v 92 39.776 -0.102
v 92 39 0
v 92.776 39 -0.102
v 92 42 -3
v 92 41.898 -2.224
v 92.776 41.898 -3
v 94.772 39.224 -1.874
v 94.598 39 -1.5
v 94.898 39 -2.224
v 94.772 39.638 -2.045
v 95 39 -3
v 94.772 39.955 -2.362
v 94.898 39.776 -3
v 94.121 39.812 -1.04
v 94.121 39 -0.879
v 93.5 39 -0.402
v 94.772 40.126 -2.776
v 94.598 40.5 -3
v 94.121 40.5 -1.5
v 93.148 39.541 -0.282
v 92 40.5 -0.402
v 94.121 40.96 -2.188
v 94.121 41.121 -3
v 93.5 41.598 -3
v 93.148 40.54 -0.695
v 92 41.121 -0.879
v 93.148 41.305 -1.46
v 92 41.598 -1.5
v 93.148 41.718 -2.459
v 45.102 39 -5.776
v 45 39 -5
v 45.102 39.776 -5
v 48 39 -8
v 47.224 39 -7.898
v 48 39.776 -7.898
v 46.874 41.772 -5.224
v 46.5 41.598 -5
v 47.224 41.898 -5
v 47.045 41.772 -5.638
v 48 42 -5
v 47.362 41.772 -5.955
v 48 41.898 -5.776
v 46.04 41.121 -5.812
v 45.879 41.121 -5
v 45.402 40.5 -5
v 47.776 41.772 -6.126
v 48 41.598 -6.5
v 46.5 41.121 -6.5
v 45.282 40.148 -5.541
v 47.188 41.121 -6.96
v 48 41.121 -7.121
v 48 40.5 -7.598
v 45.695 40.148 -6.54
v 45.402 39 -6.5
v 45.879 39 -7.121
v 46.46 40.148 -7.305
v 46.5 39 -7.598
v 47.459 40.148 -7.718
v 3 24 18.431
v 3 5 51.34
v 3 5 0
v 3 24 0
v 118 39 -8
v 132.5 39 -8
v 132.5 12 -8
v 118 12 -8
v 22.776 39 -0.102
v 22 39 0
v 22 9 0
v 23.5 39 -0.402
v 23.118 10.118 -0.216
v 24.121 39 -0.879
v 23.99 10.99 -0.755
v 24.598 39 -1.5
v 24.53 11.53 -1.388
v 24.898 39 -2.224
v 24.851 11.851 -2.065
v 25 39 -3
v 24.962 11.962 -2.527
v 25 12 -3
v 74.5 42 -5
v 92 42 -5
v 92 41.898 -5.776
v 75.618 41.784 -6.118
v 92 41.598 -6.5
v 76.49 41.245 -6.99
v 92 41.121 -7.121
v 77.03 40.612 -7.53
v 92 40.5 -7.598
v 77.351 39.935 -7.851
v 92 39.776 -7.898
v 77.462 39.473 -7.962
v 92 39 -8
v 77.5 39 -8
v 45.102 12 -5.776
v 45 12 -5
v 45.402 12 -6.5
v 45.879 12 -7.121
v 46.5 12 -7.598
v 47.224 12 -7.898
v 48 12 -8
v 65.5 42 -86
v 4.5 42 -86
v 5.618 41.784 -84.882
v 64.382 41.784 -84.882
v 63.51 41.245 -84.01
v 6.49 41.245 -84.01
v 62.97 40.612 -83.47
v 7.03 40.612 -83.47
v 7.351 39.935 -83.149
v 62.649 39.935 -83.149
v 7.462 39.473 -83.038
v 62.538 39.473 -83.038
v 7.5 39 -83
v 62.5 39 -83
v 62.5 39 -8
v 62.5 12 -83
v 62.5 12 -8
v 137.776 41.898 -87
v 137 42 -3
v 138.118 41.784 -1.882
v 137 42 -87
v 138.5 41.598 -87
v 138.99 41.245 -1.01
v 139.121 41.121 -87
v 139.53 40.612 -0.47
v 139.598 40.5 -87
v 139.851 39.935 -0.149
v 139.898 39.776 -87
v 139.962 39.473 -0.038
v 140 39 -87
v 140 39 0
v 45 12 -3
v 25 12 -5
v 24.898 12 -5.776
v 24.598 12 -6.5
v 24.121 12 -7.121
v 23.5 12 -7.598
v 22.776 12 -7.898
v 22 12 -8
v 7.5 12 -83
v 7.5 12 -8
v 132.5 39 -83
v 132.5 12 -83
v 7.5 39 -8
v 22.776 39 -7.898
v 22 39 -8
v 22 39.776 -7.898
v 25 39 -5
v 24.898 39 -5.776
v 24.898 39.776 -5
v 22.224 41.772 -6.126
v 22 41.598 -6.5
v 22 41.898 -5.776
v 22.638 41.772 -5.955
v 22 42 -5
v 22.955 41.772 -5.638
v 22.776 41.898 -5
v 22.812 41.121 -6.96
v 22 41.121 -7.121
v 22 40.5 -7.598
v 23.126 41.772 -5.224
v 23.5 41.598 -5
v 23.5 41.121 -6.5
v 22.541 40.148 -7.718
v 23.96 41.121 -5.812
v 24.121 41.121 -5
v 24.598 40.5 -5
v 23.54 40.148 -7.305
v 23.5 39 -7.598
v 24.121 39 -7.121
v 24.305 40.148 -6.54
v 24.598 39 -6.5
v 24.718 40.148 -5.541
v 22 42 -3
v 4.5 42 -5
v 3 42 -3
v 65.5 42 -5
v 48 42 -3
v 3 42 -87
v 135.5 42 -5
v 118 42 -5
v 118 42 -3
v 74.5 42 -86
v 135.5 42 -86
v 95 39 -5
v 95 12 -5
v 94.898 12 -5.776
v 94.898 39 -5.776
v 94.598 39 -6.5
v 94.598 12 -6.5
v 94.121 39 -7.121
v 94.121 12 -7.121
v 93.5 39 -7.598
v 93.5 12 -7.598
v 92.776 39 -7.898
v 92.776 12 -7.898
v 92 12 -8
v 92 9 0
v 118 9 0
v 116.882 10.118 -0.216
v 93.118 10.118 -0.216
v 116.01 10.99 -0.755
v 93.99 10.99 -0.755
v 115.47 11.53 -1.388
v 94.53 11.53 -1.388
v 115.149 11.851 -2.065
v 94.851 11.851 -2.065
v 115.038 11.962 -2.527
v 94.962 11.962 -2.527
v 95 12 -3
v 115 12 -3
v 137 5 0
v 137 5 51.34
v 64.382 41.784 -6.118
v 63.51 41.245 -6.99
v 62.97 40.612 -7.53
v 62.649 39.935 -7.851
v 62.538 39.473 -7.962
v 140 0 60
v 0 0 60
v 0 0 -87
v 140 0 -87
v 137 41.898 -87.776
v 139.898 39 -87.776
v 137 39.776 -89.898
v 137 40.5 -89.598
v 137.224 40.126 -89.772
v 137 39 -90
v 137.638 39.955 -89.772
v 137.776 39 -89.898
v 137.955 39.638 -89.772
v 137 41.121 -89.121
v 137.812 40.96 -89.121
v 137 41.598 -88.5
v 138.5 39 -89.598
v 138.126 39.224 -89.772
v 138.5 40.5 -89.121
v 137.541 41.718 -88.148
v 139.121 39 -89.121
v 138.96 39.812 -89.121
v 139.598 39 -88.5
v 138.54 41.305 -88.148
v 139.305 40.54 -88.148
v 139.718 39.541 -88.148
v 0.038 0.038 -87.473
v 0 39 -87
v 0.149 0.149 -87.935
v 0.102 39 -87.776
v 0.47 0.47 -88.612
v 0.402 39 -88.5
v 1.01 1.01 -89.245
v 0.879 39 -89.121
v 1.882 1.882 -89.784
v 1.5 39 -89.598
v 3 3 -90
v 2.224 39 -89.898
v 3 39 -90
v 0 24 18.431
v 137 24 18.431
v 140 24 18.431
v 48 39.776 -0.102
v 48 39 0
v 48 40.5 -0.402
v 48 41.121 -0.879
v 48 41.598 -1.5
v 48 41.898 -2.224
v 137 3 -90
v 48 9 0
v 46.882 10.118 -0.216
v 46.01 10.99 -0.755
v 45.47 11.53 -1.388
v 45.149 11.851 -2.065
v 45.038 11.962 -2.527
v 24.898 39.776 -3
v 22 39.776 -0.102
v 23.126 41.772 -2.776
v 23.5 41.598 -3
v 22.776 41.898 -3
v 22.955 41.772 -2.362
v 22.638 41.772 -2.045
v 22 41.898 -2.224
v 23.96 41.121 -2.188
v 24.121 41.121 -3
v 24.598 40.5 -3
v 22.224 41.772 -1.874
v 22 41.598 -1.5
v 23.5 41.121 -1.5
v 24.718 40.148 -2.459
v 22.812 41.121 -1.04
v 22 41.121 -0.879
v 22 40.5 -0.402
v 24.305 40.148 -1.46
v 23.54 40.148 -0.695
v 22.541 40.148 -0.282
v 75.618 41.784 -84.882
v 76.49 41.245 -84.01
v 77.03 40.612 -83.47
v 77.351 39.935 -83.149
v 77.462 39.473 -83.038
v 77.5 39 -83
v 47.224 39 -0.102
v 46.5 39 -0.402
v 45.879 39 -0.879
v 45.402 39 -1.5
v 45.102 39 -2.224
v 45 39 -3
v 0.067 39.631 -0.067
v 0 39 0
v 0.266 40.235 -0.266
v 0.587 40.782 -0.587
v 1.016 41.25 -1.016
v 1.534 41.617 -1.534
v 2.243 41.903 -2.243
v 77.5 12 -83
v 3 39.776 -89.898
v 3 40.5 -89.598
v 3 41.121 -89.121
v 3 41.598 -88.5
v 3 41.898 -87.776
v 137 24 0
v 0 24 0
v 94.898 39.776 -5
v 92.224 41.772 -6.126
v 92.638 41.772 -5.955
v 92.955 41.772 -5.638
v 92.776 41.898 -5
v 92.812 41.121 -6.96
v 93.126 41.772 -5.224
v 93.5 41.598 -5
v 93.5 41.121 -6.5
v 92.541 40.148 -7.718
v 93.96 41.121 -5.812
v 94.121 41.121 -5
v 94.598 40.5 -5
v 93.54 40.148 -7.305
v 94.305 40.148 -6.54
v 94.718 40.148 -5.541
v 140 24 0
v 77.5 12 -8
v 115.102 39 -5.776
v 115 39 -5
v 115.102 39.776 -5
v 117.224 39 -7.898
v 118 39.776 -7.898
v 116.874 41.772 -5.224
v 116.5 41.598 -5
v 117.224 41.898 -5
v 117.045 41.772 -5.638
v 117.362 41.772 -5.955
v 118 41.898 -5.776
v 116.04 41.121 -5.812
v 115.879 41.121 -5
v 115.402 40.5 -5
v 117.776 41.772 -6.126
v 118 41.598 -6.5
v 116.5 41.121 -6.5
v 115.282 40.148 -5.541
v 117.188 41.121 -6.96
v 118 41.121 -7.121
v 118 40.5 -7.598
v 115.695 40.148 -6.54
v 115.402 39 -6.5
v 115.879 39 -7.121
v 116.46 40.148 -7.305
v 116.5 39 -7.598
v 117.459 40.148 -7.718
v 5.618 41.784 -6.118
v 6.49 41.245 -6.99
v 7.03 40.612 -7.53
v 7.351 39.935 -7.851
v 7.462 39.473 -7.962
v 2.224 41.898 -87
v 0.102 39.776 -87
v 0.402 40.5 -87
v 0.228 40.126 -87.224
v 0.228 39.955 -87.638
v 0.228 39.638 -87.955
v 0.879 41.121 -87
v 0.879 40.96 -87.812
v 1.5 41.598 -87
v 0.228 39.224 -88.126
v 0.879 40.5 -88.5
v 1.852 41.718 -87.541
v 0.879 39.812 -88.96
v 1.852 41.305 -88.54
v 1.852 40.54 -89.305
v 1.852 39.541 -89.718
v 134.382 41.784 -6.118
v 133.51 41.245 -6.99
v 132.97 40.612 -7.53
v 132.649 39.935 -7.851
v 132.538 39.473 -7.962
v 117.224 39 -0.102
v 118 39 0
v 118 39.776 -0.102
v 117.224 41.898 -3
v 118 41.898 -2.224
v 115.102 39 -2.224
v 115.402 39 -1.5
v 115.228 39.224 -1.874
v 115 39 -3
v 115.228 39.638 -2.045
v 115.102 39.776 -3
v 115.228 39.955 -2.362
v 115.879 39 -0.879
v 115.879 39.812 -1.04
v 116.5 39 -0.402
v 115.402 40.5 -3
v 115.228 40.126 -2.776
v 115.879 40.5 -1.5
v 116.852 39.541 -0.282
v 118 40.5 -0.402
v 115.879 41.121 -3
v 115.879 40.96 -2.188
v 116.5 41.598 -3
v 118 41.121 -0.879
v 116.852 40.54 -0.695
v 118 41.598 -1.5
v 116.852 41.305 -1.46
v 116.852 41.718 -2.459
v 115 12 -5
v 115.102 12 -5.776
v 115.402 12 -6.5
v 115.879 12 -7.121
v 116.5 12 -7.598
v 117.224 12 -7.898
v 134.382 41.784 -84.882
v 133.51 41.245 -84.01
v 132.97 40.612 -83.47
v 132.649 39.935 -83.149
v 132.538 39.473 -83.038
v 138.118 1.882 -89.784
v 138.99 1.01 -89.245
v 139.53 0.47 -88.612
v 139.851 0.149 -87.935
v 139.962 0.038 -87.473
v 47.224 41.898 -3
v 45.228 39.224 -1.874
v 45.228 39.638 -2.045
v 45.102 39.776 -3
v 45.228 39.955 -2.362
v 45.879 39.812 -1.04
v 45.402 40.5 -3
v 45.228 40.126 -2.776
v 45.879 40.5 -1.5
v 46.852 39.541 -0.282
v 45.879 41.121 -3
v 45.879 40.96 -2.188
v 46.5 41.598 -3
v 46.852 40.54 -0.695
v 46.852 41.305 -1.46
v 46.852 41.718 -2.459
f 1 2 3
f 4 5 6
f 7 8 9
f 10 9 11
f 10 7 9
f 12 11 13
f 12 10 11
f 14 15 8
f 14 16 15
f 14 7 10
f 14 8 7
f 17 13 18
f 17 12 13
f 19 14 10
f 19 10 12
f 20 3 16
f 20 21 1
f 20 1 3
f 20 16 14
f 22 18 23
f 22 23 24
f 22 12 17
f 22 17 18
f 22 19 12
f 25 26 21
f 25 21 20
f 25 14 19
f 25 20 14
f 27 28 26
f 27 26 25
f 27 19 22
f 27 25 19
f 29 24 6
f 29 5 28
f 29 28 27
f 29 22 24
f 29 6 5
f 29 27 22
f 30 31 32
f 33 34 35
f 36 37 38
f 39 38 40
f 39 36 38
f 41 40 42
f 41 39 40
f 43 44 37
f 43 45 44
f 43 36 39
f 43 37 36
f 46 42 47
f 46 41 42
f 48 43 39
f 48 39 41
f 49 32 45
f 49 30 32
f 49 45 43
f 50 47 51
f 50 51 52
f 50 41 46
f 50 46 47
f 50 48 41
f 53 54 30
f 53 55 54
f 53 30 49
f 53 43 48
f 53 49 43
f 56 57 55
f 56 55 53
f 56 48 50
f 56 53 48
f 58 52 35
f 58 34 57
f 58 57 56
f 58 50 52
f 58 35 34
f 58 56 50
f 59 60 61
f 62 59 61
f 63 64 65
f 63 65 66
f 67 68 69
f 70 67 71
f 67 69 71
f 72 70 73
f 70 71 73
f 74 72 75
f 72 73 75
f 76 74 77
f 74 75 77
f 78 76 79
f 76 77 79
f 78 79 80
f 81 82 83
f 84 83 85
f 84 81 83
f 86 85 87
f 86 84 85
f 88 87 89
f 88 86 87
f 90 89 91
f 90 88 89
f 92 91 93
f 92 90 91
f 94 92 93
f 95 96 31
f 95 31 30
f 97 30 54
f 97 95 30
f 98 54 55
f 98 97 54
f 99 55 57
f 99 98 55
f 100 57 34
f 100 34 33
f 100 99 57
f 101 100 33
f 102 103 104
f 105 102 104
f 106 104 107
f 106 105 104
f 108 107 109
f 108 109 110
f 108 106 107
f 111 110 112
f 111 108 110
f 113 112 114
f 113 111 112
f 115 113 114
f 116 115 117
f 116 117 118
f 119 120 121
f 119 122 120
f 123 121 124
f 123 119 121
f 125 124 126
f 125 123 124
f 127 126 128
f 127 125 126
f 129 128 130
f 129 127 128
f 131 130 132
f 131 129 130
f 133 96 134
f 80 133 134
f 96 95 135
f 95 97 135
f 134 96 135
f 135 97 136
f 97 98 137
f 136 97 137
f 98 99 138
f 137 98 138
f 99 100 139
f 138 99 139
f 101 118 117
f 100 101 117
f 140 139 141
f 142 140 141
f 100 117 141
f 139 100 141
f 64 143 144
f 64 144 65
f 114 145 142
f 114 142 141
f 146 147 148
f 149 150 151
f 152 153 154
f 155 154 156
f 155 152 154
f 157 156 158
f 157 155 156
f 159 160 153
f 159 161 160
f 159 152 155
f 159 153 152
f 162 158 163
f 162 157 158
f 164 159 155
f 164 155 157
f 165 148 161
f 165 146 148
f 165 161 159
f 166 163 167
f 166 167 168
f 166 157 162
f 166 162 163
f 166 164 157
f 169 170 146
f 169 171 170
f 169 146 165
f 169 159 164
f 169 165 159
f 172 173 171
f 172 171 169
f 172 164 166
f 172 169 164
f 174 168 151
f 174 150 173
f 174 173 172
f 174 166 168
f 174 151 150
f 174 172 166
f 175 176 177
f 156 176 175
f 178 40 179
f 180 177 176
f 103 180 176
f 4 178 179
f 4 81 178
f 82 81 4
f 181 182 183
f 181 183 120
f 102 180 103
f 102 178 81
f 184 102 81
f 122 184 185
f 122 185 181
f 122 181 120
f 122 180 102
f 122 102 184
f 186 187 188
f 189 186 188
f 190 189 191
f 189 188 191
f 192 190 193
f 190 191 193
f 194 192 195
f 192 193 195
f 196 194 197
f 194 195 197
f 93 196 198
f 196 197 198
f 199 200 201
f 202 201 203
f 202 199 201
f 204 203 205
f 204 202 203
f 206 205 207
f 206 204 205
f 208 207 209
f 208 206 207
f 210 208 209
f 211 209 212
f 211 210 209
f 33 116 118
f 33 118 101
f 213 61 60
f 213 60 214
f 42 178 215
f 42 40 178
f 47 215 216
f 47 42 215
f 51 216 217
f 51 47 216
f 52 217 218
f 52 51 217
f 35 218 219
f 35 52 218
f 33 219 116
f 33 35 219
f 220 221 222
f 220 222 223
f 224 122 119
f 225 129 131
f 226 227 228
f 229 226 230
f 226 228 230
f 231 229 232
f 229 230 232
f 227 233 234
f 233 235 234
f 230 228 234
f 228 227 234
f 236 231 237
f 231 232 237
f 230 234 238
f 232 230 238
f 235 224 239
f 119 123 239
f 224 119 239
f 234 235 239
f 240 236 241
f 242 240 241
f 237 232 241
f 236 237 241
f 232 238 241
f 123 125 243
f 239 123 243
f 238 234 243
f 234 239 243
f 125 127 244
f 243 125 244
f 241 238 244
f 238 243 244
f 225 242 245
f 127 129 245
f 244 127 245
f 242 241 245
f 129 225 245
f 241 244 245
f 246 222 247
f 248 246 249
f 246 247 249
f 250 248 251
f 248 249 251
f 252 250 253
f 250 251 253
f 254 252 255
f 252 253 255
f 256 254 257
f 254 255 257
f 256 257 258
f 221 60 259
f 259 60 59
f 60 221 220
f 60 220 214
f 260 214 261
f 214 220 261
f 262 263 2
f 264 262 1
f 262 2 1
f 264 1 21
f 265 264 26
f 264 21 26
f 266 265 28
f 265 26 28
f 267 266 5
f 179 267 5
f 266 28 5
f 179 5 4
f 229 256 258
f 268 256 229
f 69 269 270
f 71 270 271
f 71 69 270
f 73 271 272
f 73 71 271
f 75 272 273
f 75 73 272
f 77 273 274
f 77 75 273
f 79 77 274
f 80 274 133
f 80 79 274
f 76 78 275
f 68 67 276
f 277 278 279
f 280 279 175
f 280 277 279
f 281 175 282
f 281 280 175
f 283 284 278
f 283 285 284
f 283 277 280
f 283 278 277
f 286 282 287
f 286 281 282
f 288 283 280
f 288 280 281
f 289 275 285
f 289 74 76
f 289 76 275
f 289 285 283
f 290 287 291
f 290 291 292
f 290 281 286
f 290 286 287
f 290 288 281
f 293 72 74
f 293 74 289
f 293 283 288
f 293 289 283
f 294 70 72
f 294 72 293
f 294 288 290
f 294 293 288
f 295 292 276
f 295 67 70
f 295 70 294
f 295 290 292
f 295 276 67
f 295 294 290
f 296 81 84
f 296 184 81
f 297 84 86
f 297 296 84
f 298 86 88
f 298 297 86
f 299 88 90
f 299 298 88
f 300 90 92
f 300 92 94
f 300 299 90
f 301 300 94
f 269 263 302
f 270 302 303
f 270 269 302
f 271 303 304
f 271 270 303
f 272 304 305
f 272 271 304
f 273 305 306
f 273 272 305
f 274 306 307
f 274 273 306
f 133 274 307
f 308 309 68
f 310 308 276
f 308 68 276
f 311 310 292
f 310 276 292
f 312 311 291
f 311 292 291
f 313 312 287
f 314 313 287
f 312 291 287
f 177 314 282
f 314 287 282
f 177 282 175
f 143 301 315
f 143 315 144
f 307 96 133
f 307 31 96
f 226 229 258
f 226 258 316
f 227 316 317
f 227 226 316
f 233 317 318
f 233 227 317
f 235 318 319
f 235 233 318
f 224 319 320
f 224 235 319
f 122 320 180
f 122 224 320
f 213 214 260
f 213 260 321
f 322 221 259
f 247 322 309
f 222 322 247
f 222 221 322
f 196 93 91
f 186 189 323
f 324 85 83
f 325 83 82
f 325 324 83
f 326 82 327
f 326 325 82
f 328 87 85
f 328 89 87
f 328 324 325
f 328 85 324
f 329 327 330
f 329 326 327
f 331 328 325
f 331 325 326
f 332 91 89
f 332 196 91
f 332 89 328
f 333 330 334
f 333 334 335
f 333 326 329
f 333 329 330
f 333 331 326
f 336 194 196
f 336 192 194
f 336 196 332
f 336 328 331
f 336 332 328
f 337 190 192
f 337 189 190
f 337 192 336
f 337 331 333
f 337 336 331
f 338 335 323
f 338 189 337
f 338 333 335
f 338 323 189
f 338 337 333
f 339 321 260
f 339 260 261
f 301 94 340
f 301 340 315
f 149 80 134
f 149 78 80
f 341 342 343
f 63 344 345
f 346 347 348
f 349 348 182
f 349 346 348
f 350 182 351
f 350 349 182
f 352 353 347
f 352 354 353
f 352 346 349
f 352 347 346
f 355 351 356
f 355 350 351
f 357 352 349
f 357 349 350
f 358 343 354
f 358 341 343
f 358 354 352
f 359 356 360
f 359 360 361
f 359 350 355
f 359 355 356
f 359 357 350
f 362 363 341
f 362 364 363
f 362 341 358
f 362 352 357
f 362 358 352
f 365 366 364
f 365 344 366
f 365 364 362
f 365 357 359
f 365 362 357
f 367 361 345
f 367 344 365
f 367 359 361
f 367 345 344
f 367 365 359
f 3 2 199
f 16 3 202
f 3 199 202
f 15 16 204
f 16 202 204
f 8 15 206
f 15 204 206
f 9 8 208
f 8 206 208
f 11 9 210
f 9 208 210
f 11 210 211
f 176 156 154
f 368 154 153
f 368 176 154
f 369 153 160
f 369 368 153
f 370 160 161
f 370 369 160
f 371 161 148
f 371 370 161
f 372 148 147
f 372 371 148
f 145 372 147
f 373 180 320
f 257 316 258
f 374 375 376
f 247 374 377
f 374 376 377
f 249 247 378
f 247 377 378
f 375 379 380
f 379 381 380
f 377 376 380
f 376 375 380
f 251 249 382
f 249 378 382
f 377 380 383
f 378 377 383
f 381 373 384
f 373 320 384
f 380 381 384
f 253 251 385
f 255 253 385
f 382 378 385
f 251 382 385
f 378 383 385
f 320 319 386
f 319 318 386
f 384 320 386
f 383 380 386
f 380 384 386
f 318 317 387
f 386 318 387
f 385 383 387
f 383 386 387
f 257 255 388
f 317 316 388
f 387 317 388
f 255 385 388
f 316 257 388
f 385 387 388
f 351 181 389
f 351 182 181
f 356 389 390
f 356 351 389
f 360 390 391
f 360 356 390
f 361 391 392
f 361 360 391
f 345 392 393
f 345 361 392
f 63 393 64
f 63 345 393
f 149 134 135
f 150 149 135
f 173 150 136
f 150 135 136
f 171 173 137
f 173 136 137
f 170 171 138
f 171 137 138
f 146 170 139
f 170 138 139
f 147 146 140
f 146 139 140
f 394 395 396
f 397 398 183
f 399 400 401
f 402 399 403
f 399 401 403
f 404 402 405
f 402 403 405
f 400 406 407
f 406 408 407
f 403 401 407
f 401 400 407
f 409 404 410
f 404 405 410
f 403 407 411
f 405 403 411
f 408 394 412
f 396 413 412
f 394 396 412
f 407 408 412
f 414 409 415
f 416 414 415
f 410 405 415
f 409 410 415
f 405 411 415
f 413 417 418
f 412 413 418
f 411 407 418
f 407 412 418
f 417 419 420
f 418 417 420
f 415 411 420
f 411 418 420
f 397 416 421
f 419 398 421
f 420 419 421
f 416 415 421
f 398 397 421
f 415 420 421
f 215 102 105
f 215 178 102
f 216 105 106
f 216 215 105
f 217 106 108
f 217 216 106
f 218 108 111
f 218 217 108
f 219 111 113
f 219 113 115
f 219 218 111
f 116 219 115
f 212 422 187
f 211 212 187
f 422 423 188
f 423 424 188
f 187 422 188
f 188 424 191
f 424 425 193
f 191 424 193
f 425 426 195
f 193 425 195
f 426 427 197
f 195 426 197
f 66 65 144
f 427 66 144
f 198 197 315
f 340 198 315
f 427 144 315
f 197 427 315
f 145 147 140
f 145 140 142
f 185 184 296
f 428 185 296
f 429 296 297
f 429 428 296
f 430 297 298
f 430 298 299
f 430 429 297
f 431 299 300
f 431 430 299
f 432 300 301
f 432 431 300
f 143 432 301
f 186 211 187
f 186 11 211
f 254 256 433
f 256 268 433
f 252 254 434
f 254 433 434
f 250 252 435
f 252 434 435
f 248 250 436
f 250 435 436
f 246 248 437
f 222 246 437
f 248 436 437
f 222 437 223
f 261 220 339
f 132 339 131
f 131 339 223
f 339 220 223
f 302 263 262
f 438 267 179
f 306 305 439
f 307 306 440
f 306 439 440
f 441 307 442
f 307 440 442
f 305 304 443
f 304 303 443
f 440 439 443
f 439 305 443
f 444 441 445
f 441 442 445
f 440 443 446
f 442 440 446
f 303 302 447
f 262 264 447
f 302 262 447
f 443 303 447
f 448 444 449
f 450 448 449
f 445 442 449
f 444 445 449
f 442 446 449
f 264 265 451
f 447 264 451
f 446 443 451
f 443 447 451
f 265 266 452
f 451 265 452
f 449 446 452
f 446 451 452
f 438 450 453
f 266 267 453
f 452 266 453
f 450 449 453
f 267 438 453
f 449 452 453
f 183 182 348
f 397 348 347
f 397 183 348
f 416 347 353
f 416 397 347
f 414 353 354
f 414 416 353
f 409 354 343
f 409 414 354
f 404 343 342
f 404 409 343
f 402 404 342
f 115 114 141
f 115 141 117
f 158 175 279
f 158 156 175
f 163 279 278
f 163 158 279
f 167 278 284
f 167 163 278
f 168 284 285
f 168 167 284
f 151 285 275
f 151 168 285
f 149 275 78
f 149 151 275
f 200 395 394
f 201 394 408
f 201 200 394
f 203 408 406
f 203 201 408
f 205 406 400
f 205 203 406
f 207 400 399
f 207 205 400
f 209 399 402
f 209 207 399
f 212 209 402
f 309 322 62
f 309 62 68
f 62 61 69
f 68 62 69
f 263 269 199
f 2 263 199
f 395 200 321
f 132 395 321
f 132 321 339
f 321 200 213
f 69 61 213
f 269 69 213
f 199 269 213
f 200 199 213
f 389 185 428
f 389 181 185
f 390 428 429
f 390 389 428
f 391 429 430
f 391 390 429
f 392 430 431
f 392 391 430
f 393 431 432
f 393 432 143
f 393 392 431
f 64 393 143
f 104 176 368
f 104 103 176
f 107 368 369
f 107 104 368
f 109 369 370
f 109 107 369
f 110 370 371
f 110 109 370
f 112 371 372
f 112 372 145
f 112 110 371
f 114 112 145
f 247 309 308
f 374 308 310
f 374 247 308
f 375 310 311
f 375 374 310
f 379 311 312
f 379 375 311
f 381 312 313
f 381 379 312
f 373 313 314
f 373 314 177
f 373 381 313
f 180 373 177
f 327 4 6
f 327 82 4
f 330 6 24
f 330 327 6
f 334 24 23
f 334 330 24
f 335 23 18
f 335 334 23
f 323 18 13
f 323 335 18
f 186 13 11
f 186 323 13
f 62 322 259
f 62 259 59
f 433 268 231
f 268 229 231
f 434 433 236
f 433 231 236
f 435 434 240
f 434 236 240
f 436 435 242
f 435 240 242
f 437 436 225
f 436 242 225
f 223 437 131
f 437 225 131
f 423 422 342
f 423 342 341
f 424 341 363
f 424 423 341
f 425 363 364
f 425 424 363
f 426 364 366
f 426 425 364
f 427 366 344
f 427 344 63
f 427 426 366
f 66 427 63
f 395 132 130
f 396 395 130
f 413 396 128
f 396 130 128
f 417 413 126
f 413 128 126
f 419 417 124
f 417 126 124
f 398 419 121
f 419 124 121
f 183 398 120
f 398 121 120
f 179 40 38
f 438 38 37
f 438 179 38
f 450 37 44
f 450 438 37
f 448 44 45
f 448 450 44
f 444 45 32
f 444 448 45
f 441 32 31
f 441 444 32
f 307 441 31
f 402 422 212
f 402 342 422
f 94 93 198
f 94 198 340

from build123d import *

# Parameters (mm, degrees)
SKETCH1_W               = 140
SKETCH1_H               = 90
BOSS_EXTRUDE1_DEPTH     = 42
CUT_EXTRUDE1_DEPTH      = 30
FILLET2_R               = 3
SKETCH3_W               = 140
SKETCH3_H               = 60
BOSS_EXTRUDE2_DEPTH     = 5
SKETCH4_W               = 3
SKETCH4_H               = 60
BOSS_EXTRUDE3_DEPTH     = 19
CUT_EXTRUDE2_DEPTH      = 172.650808329
CUT_EXTRUDE2_DEPTH_BACK = 172.650808329


with BuildPart() as part:
    # Sketch1 → Boss-Extrude1 (new body)
    with BuildSketch(Plane(origin=(0, 0, 0), x_dir=(1, 0, 0), z_dir=(0, 1, 0))):
        with Locations((70, 45)):
            Rectangle(SKETCH1_W, SKETCH1_H)
    extrude(amount=BOSS_EXTRUDE1_DEPTH)

    # Sketch2 → Cut-Extrude1 (cut)
    with BuildSketch(Plane(origin=(0, 42, 0), x_dir=(1, 0, 0), z_dir=(0, 1, 0))):
        Polygon((7.5, 8), (7.5, 83), (62.5, 83), (62.5, 8), (45, 8), (45, 0), (25, 0), (25, 8), align=None)
        Polygon((77.5, 8), (77.5, 83), (132.5, 83), (132.5, 8), (115, 8), (115, 0), (95, 0), (95, 8), align=None)
    extrude(amount=-CUT_EXTRUDE1_DEPTH, mode=Mode.SUBTRACT)

    # Fillet2
    fillet2_edges = [part.edges().sort_by_distance(p)[0] for p in [
        (140, 42, -45),
        (70, 42, 0),
        (127.5, 42, 0),
        (70, 42, -90),
        (25, 27, -8),
        (45, 27, -8),
        (35, 12, 0),
        (45, 27, 0),
        (25, 27, 0),
        (16.25, 42, -8),
        (25, 42, -4),
        (45, 42, -4),
        (53.75, 42, -8),
        (62.5, 42, -45.5),
        (35, 42, -83),
        (7.5, 42, -45.5),
        (95, 27, -8),
        (115, 27, -8),
        (105, 12, 0),
        (115, 27, 0),
        (95, 27, 0),
        (86.25, 42, -8),
        (95, 42, -4),
        (115, 42, -4),
        (123.75, 42, -8),
        (132.5, 42, -45.5),
        (105, 42, -83),
        (77.5, 42, -45.5),
        (0, 42, -45),
        (70, 0, -90),
        (0, 21, -90),
        (140, 21, -90),
        (12.5, 42, 0),
    ]]
    fillet(fillet2_edges, radius=FILLET2_R)

    # Sketch3 → Boss-Extrude2 (add)
    with BuildSketch(Plane(origin=(0, 0, 0), x_dir=(1, 0, 0), z_dir=(0, 1, 0))):
        with Locations((70, -30)):
            Rectangle(SKETCH3_W, SKETCH3_H)
    extrude(amount=BOSS_EXTRUDE2_DEPTH)

    # Sketch4 → Boss-Extrude3 (add)
    with BuildSketch(Plane(origin=(0, 5, 0), x_dir=(1, 0, 0), z_dir=(0, 1, 0))):
        with Locations((1.5, -30)):
            Rectangle(SKETCH4_W, SKETCH4_H)
        with Locations((138.5, -30)):
            Rectangle(SKETCH4_W, SKETCH4_H)
    extrude(amount=BOSS_EXTRUDE3_DEPTH)

    # Sketch5 → Cut-Extrude2 (cut, two sides: drawn at the far end of the back side and taken through both)
    with BuildSketch(Plane.ZY.offset(-CUT_EXTRUDE2_DEPTH_BACK)):
        Polygon((60, 0), (8.038475773, 30), (60, 30), align=None)
    extrude(amount=CUT_EXTRUDE2_DEPTH + CUT_EXTRUDE2_DEPTH_BACK, mode=Mode.SUBTRACT)


solid = part.part
